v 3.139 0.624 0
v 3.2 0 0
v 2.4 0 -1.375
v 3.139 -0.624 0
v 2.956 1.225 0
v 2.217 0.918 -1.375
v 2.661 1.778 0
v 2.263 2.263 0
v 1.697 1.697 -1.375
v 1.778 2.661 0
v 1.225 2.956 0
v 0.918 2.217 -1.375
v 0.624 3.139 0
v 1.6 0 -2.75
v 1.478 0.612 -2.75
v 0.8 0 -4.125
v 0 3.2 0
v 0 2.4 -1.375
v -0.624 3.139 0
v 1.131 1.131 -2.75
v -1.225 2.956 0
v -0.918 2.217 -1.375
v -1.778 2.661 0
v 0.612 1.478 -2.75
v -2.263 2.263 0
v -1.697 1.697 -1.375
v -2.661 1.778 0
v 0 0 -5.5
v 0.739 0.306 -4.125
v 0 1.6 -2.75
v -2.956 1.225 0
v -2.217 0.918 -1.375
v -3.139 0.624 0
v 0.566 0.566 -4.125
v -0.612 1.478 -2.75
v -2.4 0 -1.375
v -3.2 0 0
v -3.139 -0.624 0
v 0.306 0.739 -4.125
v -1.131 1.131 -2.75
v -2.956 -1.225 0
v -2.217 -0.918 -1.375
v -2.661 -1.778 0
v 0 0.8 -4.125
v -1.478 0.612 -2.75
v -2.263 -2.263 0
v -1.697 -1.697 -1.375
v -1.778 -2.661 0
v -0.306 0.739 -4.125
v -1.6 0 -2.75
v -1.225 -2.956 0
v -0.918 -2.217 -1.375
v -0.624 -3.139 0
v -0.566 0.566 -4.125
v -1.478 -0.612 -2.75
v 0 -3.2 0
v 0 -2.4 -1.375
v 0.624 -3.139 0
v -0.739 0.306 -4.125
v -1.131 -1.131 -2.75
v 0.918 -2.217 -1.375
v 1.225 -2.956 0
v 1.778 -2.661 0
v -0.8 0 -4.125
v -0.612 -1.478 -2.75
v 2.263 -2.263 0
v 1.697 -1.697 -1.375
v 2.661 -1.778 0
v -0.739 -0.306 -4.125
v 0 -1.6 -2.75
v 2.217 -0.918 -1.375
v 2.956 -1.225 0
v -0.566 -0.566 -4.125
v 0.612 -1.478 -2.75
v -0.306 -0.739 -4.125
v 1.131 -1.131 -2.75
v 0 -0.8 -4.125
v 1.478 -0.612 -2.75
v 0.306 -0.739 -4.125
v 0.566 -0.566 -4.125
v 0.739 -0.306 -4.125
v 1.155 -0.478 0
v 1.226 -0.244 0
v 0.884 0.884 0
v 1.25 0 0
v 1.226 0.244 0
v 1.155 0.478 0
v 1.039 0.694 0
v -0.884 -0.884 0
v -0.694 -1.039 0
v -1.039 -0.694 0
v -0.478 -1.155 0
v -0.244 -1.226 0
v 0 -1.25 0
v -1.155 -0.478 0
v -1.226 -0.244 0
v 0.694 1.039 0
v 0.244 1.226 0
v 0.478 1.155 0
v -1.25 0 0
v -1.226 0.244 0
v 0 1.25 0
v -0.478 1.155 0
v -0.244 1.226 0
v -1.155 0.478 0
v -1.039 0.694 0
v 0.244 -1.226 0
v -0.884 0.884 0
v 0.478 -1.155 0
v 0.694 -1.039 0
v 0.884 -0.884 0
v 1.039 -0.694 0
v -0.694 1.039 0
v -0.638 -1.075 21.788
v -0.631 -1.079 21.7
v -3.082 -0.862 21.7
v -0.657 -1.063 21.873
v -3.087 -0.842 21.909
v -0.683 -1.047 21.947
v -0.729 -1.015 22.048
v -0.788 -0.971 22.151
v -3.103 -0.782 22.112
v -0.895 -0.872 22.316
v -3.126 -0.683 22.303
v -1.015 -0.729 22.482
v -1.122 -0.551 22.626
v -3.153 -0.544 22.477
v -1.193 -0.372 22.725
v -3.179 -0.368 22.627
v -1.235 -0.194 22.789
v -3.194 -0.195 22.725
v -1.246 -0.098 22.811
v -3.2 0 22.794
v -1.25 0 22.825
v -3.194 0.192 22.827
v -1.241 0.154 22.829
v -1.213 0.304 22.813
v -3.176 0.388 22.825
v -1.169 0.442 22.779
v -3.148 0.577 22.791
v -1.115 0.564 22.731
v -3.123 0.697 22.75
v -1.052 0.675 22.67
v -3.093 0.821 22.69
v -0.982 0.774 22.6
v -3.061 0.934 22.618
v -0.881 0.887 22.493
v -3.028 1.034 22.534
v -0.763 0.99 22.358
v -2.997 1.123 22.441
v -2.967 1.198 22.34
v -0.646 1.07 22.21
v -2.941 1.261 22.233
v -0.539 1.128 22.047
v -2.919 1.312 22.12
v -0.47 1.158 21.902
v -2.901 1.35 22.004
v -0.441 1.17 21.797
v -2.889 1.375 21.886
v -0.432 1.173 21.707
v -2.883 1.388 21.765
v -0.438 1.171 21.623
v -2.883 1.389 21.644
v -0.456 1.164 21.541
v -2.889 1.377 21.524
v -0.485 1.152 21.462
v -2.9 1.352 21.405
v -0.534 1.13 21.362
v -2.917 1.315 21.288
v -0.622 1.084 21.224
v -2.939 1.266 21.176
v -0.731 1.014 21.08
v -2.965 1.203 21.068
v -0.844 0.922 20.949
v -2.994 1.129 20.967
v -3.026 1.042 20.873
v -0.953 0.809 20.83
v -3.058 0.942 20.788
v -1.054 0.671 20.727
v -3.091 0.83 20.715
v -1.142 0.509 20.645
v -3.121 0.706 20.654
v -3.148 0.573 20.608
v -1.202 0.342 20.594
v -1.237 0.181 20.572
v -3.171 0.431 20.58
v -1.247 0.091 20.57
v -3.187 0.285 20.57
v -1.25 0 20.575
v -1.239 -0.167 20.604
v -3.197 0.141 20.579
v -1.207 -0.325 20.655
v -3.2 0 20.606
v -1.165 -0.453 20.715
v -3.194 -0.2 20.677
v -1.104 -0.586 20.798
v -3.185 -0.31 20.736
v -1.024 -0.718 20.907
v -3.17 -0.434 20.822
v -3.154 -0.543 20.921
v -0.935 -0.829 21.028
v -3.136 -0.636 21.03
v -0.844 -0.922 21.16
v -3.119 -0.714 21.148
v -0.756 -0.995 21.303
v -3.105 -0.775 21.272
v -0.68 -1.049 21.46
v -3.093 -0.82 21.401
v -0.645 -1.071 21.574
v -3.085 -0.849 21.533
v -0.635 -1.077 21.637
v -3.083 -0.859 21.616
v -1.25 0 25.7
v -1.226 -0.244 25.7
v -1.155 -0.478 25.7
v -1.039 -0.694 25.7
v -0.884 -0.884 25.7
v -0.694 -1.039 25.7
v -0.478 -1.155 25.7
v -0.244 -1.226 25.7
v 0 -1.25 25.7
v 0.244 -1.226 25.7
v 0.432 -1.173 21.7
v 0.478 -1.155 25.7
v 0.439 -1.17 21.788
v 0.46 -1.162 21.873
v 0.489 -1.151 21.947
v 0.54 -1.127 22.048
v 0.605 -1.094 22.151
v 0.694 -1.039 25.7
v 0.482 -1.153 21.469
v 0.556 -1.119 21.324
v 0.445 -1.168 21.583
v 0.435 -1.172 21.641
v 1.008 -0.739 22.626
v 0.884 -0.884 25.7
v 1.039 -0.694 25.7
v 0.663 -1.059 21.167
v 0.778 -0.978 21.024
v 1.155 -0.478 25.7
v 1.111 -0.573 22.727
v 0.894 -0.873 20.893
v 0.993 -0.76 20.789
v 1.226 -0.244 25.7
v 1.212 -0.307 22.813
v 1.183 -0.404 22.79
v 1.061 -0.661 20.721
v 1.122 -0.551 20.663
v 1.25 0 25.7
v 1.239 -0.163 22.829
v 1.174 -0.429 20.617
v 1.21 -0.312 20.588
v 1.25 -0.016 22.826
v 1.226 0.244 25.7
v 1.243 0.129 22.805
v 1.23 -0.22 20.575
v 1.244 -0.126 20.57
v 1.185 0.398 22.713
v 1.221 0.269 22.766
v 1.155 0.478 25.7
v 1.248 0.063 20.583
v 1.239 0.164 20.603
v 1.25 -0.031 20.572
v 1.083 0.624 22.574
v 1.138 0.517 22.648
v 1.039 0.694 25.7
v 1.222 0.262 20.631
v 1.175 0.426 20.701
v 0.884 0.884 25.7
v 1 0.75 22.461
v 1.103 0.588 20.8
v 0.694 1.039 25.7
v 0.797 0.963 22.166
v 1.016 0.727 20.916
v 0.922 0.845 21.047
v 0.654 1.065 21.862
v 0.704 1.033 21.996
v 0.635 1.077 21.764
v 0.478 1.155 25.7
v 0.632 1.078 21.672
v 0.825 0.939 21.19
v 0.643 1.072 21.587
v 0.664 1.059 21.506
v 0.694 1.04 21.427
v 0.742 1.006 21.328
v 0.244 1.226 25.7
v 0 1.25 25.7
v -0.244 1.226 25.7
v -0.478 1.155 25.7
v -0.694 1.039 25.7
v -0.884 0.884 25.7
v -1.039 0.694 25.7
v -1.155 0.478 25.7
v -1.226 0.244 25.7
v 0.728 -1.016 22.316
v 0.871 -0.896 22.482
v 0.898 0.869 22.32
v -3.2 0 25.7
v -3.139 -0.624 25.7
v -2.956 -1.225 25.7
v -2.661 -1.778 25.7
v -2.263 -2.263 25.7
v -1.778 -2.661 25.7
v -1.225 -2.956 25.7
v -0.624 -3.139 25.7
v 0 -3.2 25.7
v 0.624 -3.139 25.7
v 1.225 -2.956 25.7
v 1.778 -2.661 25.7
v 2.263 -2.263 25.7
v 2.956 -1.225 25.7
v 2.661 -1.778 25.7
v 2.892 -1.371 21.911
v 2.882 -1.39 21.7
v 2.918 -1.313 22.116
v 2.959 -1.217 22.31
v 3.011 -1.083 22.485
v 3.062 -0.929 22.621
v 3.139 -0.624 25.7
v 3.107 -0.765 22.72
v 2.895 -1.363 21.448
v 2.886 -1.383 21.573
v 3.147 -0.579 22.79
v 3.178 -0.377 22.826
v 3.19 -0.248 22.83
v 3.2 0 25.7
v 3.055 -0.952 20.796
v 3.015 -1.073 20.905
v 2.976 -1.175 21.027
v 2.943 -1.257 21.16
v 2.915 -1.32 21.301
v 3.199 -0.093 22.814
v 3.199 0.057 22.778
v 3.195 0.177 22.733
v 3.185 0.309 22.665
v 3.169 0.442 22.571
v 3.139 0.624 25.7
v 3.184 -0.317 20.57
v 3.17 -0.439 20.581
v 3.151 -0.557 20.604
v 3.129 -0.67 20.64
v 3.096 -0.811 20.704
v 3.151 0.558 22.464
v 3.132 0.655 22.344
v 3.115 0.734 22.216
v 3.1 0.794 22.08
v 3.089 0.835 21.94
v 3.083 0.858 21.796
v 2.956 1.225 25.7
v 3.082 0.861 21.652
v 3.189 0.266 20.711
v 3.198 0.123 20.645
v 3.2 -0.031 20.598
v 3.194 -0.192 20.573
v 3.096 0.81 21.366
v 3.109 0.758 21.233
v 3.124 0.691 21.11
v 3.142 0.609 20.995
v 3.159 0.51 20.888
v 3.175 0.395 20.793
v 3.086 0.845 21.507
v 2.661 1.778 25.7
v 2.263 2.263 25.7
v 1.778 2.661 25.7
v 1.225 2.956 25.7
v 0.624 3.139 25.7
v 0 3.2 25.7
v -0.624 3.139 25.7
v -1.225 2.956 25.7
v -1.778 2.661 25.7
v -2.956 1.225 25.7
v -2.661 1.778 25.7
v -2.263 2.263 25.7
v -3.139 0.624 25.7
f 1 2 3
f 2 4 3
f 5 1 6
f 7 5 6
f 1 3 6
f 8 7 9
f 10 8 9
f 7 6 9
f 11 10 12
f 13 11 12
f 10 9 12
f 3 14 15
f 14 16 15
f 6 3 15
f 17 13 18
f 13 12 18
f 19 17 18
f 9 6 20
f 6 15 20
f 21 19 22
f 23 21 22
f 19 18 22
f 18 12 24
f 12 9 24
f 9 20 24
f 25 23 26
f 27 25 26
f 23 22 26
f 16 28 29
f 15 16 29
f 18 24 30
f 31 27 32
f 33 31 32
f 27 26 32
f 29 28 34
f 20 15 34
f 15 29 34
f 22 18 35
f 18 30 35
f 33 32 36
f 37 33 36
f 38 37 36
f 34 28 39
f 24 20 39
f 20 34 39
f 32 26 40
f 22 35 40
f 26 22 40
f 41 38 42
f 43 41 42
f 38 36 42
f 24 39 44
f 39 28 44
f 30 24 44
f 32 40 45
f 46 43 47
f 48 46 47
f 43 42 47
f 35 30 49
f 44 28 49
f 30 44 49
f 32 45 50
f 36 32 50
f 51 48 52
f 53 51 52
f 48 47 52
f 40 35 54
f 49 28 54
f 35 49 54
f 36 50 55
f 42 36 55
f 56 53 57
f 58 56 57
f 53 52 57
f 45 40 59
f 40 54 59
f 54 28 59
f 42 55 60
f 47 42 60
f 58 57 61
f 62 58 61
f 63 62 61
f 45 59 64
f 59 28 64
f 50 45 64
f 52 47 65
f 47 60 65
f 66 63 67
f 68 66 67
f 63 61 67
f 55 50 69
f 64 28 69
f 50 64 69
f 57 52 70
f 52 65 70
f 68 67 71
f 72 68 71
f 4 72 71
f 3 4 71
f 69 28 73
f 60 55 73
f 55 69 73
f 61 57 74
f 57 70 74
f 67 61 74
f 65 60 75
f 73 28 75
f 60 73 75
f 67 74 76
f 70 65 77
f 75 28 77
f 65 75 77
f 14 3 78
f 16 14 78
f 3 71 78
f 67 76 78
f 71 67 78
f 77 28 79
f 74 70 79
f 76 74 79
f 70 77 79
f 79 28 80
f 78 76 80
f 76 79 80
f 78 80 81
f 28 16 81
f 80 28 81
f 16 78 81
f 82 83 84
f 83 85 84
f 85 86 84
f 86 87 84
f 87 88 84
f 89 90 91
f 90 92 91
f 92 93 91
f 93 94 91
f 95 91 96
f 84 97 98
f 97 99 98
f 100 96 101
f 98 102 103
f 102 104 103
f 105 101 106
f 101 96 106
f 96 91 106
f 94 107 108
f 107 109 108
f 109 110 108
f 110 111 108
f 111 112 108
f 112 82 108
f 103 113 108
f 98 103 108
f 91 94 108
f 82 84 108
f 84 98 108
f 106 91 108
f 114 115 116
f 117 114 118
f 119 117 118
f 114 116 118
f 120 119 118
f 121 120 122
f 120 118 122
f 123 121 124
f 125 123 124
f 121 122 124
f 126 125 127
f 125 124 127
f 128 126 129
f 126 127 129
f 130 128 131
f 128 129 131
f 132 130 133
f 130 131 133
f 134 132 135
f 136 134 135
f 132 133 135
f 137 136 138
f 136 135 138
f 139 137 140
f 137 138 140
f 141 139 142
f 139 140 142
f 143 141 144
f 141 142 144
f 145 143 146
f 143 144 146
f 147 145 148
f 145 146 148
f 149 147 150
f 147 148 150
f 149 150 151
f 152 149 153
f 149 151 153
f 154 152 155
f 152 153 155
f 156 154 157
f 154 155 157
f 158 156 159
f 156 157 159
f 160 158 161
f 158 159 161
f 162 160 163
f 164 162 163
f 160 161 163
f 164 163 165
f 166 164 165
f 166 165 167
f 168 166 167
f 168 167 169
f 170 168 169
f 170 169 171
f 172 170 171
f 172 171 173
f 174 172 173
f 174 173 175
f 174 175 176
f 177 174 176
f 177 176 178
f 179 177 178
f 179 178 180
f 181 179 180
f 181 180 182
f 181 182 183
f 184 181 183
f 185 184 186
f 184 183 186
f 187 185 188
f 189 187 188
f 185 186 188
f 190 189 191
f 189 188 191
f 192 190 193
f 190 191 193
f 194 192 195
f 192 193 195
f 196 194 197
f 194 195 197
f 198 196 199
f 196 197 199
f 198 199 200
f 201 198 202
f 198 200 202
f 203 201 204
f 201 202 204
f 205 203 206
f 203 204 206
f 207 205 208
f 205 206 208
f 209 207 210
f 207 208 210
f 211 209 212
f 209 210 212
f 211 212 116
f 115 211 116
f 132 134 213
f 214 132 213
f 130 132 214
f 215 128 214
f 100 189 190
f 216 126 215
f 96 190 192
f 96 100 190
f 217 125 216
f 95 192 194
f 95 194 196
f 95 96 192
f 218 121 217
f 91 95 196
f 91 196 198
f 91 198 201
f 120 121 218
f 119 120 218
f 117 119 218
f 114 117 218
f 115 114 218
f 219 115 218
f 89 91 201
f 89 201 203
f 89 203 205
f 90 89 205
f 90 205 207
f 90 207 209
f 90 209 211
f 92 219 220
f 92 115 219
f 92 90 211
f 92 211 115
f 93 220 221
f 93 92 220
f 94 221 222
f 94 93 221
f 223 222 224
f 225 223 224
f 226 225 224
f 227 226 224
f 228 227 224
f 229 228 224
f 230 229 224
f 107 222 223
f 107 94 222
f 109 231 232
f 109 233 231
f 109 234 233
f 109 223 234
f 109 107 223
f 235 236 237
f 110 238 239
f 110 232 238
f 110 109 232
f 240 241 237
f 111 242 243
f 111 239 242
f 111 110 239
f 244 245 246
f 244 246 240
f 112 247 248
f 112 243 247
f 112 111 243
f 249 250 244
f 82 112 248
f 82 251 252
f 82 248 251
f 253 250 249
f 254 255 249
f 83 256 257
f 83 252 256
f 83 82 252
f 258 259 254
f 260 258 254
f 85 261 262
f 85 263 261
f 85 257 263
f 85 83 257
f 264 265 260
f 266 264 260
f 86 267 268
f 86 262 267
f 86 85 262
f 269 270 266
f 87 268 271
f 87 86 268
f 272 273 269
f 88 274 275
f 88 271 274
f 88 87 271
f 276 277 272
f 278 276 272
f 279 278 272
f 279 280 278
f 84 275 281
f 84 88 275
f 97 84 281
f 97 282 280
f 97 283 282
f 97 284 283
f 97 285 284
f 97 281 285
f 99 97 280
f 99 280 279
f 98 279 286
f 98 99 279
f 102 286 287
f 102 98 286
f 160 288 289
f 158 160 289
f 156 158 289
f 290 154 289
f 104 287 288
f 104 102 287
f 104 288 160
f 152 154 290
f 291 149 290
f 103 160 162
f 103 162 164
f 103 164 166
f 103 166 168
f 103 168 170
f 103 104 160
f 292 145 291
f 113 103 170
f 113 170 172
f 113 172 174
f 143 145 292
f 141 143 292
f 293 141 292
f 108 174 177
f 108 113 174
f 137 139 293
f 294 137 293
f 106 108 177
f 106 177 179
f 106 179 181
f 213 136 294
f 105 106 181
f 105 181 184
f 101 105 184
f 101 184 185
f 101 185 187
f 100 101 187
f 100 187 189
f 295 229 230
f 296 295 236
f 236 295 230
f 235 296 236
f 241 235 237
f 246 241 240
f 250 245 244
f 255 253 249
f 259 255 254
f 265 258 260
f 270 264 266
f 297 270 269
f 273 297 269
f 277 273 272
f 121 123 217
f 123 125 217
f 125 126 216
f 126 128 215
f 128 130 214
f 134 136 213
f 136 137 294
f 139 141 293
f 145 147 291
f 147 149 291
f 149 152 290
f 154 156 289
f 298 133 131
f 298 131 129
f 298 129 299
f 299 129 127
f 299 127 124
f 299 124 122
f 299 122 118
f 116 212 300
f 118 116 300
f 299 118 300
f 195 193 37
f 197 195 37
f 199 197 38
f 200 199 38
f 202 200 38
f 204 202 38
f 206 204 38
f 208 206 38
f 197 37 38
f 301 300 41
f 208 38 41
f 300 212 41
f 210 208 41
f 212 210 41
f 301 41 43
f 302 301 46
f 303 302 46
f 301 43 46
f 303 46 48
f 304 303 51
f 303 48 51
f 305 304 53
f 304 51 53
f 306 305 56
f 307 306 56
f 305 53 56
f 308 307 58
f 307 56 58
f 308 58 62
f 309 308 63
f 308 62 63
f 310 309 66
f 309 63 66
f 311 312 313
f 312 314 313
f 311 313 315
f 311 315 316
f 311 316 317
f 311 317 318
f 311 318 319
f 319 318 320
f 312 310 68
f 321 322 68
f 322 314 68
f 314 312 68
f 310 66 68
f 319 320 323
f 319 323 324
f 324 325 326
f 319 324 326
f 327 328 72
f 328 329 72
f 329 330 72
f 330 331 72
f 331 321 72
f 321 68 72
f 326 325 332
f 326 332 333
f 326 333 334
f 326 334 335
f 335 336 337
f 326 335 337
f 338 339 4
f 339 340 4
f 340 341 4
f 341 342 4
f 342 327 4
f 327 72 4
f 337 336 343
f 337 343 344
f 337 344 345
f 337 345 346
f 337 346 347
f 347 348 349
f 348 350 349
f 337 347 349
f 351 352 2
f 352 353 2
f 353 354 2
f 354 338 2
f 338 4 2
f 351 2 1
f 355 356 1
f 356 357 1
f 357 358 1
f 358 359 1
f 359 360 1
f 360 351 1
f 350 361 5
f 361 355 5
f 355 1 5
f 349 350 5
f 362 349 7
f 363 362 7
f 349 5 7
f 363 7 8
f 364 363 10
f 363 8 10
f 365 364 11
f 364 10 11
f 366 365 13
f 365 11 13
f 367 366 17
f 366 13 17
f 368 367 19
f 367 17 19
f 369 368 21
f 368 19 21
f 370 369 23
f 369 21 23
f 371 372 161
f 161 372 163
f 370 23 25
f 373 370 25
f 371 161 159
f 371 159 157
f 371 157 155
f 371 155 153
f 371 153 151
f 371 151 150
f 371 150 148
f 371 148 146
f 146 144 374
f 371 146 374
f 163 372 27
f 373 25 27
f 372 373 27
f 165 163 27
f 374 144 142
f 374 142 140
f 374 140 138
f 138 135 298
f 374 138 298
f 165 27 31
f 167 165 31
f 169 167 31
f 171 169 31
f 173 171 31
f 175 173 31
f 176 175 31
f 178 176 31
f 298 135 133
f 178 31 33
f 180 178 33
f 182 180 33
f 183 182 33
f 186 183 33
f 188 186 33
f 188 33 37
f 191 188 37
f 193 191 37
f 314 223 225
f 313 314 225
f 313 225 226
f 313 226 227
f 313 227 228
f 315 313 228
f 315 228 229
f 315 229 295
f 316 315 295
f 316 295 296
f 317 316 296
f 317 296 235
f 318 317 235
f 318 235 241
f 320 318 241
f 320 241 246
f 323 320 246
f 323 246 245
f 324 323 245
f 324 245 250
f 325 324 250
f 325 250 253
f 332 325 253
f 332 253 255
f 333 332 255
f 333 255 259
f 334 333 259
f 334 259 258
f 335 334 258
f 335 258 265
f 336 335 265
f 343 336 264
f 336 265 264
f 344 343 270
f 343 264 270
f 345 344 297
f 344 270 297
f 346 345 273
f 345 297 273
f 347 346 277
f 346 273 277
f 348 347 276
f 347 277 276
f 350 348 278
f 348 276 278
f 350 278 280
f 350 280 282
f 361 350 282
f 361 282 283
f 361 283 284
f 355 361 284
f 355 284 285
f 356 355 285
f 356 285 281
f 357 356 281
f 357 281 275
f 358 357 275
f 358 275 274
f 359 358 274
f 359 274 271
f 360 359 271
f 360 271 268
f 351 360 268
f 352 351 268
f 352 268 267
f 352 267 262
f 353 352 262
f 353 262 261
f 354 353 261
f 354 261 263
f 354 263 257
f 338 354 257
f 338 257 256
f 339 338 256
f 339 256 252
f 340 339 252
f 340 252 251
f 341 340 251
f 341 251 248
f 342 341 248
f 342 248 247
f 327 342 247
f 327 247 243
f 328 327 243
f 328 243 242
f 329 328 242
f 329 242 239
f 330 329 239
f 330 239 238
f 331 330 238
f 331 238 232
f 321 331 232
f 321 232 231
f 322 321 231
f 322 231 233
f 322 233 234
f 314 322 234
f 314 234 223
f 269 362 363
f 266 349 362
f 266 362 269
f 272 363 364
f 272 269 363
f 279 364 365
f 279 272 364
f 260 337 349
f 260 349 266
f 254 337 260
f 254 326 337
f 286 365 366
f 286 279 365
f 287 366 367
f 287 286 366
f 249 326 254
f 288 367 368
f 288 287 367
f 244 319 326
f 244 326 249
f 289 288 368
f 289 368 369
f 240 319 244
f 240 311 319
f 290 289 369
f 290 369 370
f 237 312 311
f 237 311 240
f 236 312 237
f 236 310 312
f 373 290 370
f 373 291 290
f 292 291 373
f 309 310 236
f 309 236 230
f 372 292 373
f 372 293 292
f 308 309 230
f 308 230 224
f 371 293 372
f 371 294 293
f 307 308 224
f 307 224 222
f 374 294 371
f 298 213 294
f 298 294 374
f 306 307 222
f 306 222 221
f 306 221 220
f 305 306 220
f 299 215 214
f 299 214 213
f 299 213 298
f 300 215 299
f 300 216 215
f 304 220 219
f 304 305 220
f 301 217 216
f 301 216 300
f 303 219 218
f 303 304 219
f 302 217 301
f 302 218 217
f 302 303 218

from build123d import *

# Parameters (mm, degrees)
SKETCH3_R                 = 3.2
BOSS_EXTRUDE2_DEPTH       = 25.7
CUT_EXTRUDE1_DEPTH        = 27.095401894
CUT_EXTRUDE1_DEPTH_BACK   = 25.7
SKETCH6_R                 = 1.25
TAP_DRILL_FOR_4_40_TAP1_D = 2.2606


with BuildPart() as part:
    # Sketch3 → Boss-Extrude2 (new body)
    with BuildSketch(Plane.XY):
        with Locations(Location((0, 0, 0), (0, 0, 180))):
            Circle(SKETCH3_R)
    extrude(amount=BOSS_EXTRUDE2_DEPTH)

    # Sketch6 → Cut-Extrude1 (cut, two sides: drawn at the far end of the back side and taken through both)
    with BuildSketch(Plane.XY.offset(25.7).offset(-CUT_EXTRUDE1_DEPTH_BACK)):
        with Locations(Location((0, 0, 0), (0, 0, 180))):
            Circle(SKETCH6_R)
    extrude(amount=CUT_EXTRUDE1_DEPTH + CUT_EXTRUDE1_DEPTH_BACK, mode=Mode.SUBTRACT)

    # Sketch7 → Revolve1 (revolve)
    with BuildSketch(Plane(origin=(0, 0, 0), x_dir=(1, 0, 0), z_dir=(0, 1, 0)), mode=Mode.PRIVATE) as revolve1_sk:
        Polygon((0, 0), (-3.2, 0), (0, 5.5), align=None)
    revolve(revolve1_sk.sketch.rotate(Axis((0, 0, -5.5), (0, 0, 1)), 180), axis=Axis((0, 0, -5.5), (0, 0, 1)))

    # Tap Drill for #4-40 Tap1 (through all)
    with Locations(Plane(origin=(3.187528357, -0.282246299, 21.7), x_dir=(0.088201968553, 0.996102611553, 0), z_dir=(0.996102611553, -0.088201968553, 0))):
        with Locations((0, 0)):
            Hole(TAP_DRILL_FOR_4_40_TAP1_D / 2)


solid = part.part
